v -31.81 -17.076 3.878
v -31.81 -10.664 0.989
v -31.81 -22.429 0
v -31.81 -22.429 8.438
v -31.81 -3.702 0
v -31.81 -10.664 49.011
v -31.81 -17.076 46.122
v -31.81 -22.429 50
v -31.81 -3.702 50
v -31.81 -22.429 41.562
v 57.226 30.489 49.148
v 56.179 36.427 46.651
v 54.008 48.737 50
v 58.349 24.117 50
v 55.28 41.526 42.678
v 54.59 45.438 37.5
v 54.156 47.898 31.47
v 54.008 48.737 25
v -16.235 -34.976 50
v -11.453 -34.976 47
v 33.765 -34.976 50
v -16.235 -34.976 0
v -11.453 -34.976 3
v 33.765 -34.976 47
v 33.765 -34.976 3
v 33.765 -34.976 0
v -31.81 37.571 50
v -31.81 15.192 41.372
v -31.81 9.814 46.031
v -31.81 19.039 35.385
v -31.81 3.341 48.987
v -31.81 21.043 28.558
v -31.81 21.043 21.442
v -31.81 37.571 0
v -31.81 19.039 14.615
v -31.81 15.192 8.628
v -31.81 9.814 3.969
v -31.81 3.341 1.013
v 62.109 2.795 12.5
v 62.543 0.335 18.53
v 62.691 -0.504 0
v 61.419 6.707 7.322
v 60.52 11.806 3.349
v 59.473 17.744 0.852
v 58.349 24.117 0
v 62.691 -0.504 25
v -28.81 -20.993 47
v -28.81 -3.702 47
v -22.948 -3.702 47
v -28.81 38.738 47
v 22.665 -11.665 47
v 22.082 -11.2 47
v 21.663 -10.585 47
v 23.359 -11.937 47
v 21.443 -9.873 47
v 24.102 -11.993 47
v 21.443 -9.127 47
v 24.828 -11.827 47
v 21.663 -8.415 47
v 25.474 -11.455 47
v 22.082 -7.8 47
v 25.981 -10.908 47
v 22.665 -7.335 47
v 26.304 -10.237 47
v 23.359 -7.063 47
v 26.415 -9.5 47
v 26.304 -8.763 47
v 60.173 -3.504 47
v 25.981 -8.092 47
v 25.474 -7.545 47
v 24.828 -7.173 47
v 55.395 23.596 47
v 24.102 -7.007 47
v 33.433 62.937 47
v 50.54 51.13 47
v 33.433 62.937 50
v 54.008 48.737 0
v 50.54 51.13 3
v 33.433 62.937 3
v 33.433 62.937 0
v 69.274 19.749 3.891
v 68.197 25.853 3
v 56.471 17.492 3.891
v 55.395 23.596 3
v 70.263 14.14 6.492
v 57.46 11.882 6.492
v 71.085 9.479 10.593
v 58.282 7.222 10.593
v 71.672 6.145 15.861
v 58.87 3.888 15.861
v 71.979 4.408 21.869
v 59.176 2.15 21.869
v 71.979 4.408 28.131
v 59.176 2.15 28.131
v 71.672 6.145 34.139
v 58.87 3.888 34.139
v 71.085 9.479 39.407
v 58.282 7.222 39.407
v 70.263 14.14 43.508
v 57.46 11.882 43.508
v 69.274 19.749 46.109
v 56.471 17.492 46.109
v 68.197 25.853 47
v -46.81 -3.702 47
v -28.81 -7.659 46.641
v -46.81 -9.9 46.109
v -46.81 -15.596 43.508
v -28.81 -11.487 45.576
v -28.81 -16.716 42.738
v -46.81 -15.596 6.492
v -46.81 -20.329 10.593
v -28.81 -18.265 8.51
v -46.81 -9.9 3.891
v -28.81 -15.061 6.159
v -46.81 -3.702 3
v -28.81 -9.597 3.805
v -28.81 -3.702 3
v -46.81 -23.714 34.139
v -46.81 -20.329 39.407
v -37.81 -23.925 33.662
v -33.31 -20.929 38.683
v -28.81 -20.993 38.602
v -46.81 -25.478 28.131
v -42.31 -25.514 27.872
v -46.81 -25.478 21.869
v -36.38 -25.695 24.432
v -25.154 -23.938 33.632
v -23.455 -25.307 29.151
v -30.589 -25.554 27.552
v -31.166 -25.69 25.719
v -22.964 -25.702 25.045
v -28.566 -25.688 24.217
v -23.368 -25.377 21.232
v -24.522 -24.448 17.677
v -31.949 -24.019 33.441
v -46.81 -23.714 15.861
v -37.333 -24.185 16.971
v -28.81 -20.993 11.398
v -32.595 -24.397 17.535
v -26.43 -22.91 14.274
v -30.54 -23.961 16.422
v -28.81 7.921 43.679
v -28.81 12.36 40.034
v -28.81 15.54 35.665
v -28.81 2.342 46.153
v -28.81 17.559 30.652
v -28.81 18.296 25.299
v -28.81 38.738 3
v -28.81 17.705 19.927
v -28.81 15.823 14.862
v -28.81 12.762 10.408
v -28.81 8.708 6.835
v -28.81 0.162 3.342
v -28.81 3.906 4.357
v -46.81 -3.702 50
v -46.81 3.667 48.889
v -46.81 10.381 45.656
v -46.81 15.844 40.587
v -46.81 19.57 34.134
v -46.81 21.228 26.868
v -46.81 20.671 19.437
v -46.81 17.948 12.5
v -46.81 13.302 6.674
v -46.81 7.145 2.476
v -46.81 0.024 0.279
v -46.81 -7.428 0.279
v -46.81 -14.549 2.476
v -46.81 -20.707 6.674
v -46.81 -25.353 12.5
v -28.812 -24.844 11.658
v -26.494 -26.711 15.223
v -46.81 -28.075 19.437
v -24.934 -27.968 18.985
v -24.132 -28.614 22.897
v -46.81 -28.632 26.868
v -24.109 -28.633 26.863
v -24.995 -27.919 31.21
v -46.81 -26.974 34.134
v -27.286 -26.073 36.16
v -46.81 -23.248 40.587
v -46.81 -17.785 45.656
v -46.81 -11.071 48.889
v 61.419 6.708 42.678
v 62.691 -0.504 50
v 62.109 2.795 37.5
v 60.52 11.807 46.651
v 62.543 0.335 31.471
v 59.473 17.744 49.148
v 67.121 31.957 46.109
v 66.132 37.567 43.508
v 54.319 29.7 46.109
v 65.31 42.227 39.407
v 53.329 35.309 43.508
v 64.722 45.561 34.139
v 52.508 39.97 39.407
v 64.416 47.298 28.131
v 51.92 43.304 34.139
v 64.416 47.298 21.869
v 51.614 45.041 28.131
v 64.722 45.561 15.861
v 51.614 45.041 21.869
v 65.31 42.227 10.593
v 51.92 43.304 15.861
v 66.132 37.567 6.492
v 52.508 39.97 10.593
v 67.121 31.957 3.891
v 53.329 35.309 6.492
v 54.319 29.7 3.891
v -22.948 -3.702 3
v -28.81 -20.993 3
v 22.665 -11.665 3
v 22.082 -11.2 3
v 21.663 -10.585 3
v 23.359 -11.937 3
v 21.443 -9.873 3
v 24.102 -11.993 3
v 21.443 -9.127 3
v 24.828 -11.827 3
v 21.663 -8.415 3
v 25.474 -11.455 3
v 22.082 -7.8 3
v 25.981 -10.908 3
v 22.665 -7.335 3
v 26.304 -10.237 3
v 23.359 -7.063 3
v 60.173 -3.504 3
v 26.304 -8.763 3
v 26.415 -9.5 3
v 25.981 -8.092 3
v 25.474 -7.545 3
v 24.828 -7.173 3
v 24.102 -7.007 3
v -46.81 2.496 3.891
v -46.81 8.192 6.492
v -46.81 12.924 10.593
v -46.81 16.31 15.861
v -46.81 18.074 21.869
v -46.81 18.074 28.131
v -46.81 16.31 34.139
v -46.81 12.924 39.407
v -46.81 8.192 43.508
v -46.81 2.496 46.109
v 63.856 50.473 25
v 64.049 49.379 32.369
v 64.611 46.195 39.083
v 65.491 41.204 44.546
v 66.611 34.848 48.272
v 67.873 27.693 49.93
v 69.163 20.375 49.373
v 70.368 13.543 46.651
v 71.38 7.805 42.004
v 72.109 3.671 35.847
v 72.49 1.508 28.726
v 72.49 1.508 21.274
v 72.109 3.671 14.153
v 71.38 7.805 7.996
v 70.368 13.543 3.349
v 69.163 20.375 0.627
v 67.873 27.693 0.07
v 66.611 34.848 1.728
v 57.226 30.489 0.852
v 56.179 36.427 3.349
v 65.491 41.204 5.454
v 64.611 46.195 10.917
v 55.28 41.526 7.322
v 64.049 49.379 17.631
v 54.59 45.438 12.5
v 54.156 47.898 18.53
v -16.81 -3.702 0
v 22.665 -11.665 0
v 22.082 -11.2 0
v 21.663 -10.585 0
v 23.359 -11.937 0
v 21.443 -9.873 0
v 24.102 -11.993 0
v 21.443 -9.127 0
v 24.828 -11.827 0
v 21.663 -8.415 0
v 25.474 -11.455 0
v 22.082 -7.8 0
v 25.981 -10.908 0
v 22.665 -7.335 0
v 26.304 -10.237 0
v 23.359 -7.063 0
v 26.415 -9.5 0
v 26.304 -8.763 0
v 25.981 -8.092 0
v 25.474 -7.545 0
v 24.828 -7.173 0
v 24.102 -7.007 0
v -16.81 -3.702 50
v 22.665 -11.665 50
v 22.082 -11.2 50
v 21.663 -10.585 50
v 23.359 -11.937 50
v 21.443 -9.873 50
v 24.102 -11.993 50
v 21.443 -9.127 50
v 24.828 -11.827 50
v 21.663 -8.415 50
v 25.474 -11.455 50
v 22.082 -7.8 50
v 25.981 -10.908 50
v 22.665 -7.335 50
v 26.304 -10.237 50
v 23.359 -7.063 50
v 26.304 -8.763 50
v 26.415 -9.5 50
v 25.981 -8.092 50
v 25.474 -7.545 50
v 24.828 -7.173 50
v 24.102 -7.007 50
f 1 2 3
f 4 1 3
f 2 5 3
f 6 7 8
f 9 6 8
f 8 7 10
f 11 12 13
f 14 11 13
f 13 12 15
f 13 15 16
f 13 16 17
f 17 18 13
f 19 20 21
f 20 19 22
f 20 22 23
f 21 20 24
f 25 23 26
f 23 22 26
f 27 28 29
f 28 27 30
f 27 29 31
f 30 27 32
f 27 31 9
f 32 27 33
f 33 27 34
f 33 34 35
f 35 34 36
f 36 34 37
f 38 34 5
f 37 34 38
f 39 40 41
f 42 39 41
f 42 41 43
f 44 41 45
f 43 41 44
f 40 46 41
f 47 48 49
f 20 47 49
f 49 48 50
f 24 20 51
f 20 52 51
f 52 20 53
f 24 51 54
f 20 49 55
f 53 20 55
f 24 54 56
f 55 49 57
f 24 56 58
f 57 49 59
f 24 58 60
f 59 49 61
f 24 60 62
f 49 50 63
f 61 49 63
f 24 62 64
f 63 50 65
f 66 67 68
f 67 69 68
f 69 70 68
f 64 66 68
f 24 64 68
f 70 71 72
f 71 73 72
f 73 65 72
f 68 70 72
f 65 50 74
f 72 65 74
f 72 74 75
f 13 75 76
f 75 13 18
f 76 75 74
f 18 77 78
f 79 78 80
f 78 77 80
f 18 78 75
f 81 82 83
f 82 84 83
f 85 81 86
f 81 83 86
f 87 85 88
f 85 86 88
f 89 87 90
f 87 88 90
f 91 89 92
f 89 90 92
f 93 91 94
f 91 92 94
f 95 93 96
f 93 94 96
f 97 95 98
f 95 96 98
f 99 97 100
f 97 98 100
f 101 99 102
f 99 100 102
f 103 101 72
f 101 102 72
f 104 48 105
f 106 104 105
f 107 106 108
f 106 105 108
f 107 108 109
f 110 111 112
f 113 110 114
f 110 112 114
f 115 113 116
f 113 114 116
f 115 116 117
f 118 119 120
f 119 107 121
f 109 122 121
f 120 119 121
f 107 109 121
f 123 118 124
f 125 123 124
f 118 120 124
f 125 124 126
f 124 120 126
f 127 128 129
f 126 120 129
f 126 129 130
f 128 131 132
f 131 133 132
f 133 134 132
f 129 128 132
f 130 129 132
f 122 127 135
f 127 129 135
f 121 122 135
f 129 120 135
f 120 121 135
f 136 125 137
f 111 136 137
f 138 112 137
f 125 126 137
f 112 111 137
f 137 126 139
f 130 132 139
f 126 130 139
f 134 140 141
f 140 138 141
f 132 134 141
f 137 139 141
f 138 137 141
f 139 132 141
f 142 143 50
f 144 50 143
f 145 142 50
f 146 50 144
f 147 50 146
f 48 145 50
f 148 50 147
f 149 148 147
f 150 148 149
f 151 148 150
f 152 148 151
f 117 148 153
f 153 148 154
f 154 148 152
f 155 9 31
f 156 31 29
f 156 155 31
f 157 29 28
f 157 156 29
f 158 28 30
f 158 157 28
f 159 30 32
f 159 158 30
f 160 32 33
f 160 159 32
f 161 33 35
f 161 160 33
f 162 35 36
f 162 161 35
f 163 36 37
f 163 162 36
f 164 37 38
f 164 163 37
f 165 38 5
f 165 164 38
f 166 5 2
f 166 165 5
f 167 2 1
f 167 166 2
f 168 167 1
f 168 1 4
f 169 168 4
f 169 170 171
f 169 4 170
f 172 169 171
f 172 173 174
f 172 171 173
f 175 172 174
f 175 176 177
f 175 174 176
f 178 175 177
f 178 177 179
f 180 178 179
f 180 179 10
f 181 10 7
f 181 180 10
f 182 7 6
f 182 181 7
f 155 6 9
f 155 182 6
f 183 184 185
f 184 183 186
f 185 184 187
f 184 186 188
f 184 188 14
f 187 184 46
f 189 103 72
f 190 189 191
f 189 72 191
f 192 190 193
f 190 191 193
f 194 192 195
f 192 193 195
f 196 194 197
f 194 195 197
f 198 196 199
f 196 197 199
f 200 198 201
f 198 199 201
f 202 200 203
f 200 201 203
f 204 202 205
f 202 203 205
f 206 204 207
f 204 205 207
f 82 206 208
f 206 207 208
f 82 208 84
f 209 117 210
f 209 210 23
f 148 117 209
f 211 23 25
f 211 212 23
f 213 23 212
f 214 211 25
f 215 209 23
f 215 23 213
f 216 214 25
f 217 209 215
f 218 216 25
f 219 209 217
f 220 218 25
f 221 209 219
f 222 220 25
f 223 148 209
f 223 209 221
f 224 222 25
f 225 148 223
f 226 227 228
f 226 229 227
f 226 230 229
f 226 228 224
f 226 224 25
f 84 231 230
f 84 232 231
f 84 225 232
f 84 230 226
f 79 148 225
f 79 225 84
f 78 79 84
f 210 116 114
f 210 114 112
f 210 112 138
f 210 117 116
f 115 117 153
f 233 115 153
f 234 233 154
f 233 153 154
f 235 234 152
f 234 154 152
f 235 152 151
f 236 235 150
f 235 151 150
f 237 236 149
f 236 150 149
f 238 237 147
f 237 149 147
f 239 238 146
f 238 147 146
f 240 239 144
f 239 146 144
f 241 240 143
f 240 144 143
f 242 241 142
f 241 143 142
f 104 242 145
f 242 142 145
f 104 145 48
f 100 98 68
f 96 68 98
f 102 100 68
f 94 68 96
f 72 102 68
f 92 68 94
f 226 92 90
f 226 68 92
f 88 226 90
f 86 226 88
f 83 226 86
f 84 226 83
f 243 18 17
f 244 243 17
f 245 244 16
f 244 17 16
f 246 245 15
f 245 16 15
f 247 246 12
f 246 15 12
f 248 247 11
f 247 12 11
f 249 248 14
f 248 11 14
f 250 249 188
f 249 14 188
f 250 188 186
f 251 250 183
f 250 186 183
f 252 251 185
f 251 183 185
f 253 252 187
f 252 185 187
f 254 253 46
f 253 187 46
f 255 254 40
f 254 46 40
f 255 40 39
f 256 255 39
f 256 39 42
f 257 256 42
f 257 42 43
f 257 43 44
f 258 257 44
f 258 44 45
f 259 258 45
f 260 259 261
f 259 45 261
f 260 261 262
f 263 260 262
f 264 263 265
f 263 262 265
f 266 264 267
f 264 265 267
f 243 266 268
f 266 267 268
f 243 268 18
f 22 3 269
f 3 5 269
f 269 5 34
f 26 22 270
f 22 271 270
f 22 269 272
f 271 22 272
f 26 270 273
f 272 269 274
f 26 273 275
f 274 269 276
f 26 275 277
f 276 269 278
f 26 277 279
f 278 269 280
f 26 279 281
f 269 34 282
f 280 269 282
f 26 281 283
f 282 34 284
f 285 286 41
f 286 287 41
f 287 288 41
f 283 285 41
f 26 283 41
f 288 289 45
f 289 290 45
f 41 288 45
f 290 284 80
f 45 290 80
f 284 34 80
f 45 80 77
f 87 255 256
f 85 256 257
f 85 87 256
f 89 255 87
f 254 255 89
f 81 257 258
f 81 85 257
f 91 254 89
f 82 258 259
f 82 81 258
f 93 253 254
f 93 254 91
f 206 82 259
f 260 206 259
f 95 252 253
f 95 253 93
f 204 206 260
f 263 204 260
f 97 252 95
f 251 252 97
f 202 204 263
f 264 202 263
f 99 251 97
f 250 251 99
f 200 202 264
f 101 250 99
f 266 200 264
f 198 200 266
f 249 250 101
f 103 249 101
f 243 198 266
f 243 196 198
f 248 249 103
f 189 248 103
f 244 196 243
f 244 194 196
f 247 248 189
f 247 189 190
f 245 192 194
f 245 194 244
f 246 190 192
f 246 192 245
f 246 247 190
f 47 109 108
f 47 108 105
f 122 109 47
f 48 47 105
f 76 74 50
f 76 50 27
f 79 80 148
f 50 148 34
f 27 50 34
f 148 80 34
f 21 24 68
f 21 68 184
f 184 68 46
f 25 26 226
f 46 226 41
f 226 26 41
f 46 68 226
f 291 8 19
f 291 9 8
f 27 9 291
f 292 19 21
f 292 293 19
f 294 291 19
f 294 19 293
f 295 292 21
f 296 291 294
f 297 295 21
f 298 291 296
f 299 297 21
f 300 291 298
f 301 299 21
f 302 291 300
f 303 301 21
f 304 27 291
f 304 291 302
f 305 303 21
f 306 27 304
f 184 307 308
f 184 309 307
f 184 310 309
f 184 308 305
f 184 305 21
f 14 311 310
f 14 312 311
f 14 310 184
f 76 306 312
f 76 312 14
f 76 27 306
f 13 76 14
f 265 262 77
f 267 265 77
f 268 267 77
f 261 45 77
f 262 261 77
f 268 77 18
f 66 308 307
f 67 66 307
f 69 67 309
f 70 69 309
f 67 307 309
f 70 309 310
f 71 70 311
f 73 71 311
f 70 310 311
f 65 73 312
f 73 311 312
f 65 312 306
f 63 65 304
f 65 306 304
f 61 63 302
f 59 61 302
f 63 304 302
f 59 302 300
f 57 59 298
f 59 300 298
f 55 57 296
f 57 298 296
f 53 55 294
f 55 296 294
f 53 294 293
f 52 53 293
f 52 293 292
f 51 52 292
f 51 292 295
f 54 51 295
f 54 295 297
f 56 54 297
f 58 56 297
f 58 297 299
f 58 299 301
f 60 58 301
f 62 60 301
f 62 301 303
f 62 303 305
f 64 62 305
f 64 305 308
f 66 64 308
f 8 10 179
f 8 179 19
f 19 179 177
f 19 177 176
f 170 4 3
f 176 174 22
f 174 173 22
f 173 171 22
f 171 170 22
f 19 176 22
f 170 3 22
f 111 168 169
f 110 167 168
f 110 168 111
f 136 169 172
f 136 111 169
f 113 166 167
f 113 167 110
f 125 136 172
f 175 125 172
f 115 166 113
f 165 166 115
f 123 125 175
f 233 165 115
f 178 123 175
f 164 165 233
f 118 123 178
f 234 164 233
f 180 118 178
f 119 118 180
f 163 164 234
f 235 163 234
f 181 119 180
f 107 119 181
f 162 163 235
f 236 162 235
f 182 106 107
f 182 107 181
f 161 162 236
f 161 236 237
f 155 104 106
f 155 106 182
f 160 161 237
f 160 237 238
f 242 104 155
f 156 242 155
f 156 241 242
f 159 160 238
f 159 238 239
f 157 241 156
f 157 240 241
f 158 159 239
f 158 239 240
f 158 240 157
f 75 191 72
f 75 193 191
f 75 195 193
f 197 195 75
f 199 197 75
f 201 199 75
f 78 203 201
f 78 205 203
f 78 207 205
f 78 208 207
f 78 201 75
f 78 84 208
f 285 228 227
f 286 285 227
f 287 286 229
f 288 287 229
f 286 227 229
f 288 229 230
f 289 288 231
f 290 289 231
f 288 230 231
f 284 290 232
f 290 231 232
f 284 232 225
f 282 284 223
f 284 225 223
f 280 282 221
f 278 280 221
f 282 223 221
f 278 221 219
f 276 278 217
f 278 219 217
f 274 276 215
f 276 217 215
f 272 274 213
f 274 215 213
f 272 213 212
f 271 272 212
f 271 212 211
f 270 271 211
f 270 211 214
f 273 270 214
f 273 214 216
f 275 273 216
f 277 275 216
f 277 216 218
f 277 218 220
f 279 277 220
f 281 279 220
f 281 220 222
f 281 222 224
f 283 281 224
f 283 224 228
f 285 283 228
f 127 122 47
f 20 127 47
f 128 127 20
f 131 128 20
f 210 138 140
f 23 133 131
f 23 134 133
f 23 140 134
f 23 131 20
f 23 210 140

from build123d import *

# Parameters (mm, degrees)
BOSS_EXTRU_1_DEPTH      = 50
ESQUISSE3_R             = 25
BOSS_EXTRU_2_DEPTH      = 10
ESQUISSE4_R             = 25
BOSS_EXTRU_3_DEPTH      = 15
COQUE2_START            = 3
COQUE2_DEPTH            = 44
ESQUISSE6_R             = 2.5
ENL_V_MAT_EXTRU_1_DEPTH = 109.272397717


with BuildPart() as part:
    # Esquisse1 → Boss.-Extru.1 (new body)
    with BuildSketch(Plane.XY):
        Polygon((-31.809910954, -22.428852102), (-16.234936413, -34.975571516), (33.765063587, -34.975571516), (62.690506023, -0.503571576), (54.008097139, 48.736816075), (33.432510355, 62.937000175), (-31.809910954, 37.571147898), align=None)
    extrude(amount=BOSS_EXTRU_1_DEPTH)

    # Esquisse3 → Boss.-Extru.2 (add)
    with BuildSketch(Plane(origin=(60.714040151, 10.705523386, 0), x_dir=(0, 0, -1), z_dir=(0.9848077530122085, 0.17364817766692822, 0))):
        with Locations(Location((-25, 13.61798668, 0), (0, 0, 90))):
            Circle(ESQUISSE3_R)
    extrude(amount=BOSS_EXTRU_2_DEPTH)

    # Esquisse4 → Boss.-Extru.3 (add, symmetric)
    with BuildSketch(Plane.ZY.offset(31.809910954)):
        with Locations((25, -3.702211809)):
            Circle(ESQUISSE4_R)
    extrude(amount=BOSS_EXTRU_3_DEPTH, both=True)

    # Coque2: read off the stored shape, not the designer's step
    # Coque2 outline → Coque2 (cut)
    with BuildSketch(Plane.XY.offset(COQUE2_START)):
        Polygon((-28.809910954, 38.737529453), (-28.809910954, -20.993225887), (-11.452809865, -34.975571516), (33.765063587, -34.975571516), (60.173207129, -3.503571576), (55.394878322, 23.595677716), (50.539748489, 51.130487267), (33.432510355, 62.937000175), align=None)
    extrude(amount=COQUE2_DEPTH, mode=Mode.SUBTRACT)

    # Coque2 2: loft between two sections, ruled curve by curve
    coque2_2_from = [
        Edge.make_three_point_arc((68.197379111, 25.853104026, 3), (72.01763902, 4.18733346, 25), (68.197379111, 25.853104026, 47)),
        Edge.make_three_point_arc((68.197379111, 25.853104026, 47), (64.377119202, 47.518874592, 25), (68.197379111, 25.853104026, 3)),
    ]
    coque2_2_to = [
        Edge.make_three_point_arc((55.394878322, 23.595677716, 3), (59.21513823, 1.92990715, 25), (55.394878322, 23.595677716, 47)),
        Edge.make_three_point_arc((55.394878322, 23.595677716, 47), (51.574618413, 45.261448283, 25), (55.394878322, 23.595677716, 3)),
    ]
    coque2_2 = Solid(Shell([*[Face.make_surface_from_curves(coque2_2_from[k], coque2_2_to[k]) for k in range(2)], Face(Wire(coque2_2_from)), Face(Wire(coque2_2_to))]))
    add(coque2_2, mode=Mode.SUBTRACT)

    # Coque2 3: loft between two sections, ruled curve by curve
    coque2_3_from = [
        Edge.make_three_point_arc((-46.809910954, -3.702211809, 47), (-46.809910954, -25.702211809, 25), (-46.809910954, -3.702211809, 3)),
        Edge.make_three_point_arc((-46.809910954, -3.702211809, 3), (-46.809910954, 18.297788191, 25), (-46.809910954, -3.702211809, 47)),
    ]
    coque2_3_to = [
        Edge.make_three_point_arc((-22.947653862, -3.702211809, 47), (-22.947653862, -25.702211809, 25), (-22.947653862, -3.702211809, 3)),
        Edge.make_three_point_arc((-22.947653862, -3.702211809, 3), (-22.947653862, 18.297788191, 25), (-22.947653862, -3.702211809, 47)),
    ]
    coque2_3 = Solid(Shell([*[Face.make_surface_from_curves(coque2_3_from[k], coque2_3_to[k]) for k in range(2)], Face(Wire(coque2_3_from)), Face(Wire(coque2_3_to))]))
    add(coque2_3, mode=Mode.SUBTRACT)

    # Esquisse6 → Enlèv. mat.-Extru.1 (cut, through all)
    with BuildSketch(Plane.XY.offset(50)):
        with Locations((23.91500674, -9.499973142)):
            Circle(ESQUISSE6_R)
    extrude(amount=-ENL_V_MAT_EXTRU_1_DEPTH, mode=Mode.SUBTRACT)


solid = part.part
